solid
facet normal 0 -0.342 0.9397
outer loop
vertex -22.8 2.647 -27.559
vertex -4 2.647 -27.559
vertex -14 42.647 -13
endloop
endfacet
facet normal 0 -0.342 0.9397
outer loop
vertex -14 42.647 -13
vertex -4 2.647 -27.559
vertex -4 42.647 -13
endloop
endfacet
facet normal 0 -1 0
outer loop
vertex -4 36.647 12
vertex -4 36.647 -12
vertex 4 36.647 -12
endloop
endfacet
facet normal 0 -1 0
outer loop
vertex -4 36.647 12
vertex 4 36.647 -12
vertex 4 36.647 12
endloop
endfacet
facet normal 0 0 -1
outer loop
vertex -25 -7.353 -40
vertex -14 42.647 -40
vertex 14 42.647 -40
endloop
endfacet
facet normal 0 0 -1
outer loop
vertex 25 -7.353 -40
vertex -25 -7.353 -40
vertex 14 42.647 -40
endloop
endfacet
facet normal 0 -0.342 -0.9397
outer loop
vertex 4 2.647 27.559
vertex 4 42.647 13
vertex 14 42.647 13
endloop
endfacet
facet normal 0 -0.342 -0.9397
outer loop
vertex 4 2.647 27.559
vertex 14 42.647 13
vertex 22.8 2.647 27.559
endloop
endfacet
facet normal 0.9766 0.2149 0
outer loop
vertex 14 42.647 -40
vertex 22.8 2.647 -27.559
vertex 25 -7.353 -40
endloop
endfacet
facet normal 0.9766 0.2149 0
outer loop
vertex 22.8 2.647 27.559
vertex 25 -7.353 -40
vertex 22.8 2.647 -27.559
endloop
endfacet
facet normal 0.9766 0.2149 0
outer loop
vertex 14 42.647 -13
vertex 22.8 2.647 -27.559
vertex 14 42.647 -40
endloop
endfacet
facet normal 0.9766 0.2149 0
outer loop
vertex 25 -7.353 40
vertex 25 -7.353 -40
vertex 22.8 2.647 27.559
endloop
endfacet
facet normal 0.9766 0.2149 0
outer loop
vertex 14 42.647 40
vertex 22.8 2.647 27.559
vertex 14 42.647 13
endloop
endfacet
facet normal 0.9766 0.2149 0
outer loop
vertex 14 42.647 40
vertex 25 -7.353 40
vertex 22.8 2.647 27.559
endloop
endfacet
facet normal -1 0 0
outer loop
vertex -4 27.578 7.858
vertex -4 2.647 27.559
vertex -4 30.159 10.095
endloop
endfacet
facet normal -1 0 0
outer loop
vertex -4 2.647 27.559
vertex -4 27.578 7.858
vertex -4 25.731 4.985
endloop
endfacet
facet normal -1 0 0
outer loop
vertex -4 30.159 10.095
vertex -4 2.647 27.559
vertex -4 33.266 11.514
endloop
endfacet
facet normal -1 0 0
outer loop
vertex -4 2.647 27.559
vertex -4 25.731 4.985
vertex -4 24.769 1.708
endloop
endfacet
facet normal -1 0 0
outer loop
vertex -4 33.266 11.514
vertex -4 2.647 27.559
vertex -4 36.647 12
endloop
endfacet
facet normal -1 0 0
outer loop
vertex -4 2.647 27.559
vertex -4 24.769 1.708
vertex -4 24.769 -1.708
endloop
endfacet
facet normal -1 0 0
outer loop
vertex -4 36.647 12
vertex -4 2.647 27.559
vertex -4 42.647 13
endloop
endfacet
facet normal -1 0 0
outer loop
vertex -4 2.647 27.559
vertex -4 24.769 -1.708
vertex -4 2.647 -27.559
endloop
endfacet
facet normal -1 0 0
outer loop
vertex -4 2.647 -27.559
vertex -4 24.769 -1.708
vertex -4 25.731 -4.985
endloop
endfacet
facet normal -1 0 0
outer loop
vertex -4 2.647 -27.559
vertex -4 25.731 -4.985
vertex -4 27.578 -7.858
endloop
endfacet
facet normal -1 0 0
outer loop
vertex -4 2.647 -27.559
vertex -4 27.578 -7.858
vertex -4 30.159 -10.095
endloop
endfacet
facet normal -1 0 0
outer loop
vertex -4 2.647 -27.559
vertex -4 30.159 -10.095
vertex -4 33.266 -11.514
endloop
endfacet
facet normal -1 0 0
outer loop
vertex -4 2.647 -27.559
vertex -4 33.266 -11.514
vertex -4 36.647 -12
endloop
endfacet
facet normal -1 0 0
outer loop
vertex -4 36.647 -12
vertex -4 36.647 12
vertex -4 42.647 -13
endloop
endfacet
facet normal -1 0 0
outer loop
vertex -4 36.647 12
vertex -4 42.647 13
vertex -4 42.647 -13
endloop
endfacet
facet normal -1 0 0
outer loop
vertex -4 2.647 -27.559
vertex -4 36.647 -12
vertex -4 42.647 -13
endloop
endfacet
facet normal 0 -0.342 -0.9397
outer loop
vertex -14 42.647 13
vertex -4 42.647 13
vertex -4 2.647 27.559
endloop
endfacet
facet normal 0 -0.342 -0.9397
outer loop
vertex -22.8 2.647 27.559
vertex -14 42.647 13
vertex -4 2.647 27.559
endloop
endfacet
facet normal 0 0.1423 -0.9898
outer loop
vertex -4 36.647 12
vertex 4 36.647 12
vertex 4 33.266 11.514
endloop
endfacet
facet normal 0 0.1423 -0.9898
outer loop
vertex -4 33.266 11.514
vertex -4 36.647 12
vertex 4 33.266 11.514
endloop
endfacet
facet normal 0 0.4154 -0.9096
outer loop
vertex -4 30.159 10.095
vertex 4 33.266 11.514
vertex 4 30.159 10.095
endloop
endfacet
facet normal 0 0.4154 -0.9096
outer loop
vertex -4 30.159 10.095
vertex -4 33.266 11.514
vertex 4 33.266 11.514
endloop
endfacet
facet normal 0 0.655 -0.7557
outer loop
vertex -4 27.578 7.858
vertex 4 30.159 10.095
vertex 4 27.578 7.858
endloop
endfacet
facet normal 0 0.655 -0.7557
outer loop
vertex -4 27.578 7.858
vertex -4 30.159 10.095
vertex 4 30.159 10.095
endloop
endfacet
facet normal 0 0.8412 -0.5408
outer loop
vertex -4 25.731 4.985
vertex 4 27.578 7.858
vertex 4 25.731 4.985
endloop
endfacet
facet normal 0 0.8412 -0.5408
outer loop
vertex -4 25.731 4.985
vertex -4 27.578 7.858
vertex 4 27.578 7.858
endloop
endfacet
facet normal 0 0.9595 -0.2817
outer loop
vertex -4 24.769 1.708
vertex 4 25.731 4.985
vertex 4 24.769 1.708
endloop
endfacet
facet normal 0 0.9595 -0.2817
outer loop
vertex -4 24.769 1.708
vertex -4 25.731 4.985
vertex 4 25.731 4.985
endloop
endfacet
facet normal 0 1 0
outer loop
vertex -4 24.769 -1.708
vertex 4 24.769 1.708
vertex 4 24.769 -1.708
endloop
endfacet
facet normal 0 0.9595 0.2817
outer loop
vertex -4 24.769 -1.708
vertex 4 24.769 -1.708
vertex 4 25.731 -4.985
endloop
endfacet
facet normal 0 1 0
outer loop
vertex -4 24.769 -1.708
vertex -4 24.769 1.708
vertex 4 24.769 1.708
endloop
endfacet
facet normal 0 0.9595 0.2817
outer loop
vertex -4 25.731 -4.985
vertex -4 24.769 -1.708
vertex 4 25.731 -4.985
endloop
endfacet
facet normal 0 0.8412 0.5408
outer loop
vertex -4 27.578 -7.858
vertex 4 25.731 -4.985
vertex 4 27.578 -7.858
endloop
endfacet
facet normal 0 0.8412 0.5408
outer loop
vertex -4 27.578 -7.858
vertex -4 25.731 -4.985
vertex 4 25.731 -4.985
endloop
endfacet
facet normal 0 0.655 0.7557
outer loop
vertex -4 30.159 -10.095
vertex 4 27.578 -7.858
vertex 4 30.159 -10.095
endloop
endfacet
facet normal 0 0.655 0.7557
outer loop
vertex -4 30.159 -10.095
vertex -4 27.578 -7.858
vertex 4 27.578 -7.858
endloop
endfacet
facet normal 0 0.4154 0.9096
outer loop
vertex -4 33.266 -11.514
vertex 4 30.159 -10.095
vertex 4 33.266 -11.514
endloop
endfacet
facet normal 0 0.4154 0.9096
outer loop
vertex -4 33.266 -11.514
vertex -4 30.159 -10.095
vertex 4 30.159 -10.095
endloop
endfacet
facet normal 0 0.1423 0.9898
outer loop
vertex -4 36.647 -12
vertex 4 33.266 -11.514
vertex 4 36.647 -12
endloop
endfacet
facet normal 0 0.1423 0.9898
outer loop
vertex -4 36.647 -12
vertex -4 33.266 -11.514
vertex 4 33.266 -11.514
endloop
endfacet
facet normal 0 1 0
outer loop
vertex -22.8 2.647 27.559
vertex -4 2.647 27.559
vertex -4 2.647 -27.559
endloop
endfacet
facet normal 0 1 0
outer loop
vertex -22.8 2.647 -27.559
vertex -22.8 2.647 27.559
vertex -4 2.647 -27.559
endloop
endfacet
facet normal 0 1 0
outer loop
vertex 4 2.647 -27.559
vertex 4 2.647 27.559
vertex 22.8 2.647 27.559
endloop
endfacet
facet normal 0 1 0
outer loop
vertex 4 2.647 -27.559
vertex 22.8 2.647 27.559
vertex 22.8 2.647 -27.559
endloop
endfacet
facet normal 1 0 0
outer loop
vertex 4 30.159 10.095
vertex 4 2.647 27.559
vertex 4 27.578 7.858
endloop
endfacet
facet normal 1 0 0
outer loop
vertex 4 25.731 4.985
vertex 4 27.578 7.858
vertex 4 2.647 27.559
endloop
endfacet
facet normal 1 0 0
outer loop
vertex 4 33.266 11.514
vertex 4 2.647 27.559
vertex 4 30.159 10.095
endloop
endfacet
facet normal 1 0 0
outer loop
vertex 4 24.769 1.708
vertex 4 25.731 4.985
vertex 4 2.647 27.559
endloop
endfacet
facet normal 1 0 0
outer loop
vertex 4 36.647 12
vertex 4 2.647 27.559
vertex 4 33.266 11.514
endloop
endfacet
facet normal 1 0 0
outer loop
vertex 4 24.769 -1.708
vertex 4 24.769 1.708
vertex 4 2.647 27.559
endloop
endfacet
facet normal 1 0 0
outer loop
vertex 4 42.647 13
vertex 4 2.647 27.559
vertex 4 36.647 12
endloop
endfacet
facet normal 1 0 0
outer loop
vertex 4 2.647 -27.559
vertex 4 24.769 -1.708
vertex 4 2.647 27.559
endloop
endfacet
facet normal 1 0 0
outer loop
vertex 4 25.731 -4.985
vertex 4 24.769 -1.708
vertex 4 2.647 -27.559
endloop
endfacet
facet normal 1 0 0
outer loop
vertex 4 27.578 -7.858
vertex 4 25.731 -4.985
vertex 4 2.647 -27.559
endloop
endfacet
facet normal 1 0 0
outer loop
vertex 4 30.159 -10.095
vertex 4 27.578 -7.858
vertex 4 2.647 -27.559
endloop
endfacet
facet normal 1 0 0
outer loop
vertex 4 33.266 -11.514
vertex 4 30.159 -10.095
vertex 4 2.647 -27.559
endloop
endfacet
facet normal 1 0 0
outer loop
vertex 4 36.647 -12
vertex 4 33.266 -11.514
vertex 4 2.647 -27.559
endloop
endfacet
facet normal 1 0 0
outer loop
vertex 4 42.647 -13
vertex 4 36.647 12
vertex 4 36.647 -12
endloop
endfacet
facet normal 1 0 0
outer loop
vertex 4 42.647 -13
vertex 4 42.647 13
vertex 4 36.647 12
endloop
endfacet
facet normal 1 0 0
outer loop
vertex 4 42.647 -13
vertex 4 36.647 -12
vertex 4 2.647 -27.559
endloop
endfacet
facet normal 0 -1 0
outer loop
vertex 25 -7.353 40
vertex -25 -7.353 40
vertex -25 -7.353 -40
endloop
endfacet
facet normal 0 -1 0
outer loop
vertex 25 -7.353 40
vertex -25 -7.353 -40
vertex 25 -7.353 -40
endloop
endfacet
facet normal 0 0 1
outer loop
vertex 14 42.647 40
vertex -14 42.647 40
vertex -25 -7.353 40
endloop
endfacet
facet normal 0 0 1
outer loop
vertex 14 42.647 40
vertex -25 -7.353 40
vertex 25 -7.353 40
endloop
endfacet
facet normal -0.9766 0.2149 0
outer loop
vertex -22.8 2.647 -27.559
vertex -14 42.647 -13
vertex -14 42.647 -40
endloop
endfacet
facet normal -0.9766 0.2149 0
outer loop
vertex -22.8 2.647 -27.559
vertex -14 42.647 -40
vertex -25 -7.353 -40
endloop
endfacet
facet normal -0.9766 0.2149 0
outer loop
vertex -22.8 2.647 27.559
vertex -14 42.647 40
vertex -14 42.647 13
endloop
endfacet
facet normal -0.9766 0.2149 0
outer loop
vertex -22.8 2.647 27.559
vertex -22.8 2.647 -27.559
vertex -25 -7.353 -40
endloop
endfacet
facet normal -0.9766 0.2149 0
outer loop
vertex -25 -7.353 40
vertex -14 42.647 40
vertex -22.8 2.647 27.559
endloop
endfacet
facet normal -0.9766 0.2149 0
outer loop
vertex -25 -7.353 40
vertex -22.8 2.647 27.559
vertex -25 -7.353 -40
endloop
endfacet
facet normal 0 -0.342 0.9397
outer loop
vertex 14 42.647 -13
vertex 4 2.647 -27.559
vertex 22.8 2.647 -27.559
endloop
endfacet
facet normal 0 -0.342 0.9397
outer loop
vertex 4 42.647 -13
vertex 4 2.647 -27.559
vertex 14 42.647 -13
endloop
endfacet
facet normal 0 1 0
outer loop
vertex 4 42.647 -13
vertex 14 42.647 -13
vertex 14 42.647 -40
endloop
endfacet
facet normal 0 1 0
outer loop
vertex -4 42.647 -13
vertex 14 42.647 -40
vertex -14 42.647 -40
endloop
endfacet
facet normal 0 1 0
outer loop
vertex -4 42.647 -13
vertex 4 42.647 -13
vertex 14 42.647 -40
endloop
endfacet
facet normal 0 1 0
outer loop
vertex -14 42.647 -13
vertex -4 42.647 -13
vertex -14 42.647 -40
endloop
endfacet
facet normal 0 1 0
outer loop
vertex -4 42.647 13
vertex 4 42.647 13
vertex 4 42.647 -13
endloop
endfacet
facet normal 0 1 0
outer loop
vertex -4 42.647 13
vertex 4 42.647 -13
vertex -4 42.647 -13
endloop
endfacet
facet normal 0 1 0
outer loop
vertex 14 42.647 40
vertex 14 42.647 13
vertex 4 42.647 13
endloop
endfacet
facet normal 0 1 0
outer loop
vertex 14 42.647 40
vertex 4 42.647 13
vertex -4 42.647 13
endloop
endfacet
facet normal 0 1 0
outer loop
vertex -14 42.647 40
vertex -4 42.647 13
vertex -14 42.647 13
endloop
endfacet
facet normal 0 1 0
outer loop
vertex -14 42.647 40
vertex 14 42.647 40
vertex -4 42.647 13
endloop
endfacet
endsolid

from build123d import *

# Parameters (mm, degrees)
EXTRUDE_1_DEPTH     = 40
CUT_EXTRUDE_START   = -4
CUT_EXTRUDE_2_DEPTH = 50
CUT_EXTRUDE_3_DEPTH = 8


with BuildPart() as part:
    # 草图3 → 凸台-拉伸1 (new, symmetric)
    with BuildSketch(Plane.XY):
        Polygon((14, 42.647058824), (-14, 42.647058824), (-25, -7.352941176), (25, -7.352941176), align=None)
    extrude(amount=EXTRUDE_1_DEPTH, both=True)

    # 草图4 → 切除-拉伸2 (cut)
    with BuildSketch(Plane(origin=(0, 0, 0), x_dir=(0, 0, -1), z_dir=(1, 0, 0)).offset(CUT_EXTRUDE_START)):
        Polygon((13, 42.647058824), (-13, 42.647058824), (-27.558809371, 2.647058824), (27.558809371, 2.647058824), align=None)
    cut_extrude_2 = extrude(amount=-CUT_EXTRUDE_2_DEPTH, mode=Mode.SUBTRACT)

    # 镜向1: 切除-拉伸2 across plane
    add(cut_extrude_2.mirror(Plane(origin=(0, 0, 0), x_dir=(0, 0, 1), z_dir=(1, 0, 0))), mode=Mode.SUBTRACT)

    # 草图6 → 切除-拉伸3 (cut)
    with BuildSketch(Plane.ZY.offset(4)):
        with BuildLine():
            Line((-12, 36.647058824), (12, 36.647058824))
            ThreePointArc((12, 36.647058824), (0, 24.647058824), (-12, 36.647058824))
        make_face()
    extrude(amount=-CUT_EXTRUDE_3_DEPTH, mode=Mode.SUBTRACT)


solid = part.part
